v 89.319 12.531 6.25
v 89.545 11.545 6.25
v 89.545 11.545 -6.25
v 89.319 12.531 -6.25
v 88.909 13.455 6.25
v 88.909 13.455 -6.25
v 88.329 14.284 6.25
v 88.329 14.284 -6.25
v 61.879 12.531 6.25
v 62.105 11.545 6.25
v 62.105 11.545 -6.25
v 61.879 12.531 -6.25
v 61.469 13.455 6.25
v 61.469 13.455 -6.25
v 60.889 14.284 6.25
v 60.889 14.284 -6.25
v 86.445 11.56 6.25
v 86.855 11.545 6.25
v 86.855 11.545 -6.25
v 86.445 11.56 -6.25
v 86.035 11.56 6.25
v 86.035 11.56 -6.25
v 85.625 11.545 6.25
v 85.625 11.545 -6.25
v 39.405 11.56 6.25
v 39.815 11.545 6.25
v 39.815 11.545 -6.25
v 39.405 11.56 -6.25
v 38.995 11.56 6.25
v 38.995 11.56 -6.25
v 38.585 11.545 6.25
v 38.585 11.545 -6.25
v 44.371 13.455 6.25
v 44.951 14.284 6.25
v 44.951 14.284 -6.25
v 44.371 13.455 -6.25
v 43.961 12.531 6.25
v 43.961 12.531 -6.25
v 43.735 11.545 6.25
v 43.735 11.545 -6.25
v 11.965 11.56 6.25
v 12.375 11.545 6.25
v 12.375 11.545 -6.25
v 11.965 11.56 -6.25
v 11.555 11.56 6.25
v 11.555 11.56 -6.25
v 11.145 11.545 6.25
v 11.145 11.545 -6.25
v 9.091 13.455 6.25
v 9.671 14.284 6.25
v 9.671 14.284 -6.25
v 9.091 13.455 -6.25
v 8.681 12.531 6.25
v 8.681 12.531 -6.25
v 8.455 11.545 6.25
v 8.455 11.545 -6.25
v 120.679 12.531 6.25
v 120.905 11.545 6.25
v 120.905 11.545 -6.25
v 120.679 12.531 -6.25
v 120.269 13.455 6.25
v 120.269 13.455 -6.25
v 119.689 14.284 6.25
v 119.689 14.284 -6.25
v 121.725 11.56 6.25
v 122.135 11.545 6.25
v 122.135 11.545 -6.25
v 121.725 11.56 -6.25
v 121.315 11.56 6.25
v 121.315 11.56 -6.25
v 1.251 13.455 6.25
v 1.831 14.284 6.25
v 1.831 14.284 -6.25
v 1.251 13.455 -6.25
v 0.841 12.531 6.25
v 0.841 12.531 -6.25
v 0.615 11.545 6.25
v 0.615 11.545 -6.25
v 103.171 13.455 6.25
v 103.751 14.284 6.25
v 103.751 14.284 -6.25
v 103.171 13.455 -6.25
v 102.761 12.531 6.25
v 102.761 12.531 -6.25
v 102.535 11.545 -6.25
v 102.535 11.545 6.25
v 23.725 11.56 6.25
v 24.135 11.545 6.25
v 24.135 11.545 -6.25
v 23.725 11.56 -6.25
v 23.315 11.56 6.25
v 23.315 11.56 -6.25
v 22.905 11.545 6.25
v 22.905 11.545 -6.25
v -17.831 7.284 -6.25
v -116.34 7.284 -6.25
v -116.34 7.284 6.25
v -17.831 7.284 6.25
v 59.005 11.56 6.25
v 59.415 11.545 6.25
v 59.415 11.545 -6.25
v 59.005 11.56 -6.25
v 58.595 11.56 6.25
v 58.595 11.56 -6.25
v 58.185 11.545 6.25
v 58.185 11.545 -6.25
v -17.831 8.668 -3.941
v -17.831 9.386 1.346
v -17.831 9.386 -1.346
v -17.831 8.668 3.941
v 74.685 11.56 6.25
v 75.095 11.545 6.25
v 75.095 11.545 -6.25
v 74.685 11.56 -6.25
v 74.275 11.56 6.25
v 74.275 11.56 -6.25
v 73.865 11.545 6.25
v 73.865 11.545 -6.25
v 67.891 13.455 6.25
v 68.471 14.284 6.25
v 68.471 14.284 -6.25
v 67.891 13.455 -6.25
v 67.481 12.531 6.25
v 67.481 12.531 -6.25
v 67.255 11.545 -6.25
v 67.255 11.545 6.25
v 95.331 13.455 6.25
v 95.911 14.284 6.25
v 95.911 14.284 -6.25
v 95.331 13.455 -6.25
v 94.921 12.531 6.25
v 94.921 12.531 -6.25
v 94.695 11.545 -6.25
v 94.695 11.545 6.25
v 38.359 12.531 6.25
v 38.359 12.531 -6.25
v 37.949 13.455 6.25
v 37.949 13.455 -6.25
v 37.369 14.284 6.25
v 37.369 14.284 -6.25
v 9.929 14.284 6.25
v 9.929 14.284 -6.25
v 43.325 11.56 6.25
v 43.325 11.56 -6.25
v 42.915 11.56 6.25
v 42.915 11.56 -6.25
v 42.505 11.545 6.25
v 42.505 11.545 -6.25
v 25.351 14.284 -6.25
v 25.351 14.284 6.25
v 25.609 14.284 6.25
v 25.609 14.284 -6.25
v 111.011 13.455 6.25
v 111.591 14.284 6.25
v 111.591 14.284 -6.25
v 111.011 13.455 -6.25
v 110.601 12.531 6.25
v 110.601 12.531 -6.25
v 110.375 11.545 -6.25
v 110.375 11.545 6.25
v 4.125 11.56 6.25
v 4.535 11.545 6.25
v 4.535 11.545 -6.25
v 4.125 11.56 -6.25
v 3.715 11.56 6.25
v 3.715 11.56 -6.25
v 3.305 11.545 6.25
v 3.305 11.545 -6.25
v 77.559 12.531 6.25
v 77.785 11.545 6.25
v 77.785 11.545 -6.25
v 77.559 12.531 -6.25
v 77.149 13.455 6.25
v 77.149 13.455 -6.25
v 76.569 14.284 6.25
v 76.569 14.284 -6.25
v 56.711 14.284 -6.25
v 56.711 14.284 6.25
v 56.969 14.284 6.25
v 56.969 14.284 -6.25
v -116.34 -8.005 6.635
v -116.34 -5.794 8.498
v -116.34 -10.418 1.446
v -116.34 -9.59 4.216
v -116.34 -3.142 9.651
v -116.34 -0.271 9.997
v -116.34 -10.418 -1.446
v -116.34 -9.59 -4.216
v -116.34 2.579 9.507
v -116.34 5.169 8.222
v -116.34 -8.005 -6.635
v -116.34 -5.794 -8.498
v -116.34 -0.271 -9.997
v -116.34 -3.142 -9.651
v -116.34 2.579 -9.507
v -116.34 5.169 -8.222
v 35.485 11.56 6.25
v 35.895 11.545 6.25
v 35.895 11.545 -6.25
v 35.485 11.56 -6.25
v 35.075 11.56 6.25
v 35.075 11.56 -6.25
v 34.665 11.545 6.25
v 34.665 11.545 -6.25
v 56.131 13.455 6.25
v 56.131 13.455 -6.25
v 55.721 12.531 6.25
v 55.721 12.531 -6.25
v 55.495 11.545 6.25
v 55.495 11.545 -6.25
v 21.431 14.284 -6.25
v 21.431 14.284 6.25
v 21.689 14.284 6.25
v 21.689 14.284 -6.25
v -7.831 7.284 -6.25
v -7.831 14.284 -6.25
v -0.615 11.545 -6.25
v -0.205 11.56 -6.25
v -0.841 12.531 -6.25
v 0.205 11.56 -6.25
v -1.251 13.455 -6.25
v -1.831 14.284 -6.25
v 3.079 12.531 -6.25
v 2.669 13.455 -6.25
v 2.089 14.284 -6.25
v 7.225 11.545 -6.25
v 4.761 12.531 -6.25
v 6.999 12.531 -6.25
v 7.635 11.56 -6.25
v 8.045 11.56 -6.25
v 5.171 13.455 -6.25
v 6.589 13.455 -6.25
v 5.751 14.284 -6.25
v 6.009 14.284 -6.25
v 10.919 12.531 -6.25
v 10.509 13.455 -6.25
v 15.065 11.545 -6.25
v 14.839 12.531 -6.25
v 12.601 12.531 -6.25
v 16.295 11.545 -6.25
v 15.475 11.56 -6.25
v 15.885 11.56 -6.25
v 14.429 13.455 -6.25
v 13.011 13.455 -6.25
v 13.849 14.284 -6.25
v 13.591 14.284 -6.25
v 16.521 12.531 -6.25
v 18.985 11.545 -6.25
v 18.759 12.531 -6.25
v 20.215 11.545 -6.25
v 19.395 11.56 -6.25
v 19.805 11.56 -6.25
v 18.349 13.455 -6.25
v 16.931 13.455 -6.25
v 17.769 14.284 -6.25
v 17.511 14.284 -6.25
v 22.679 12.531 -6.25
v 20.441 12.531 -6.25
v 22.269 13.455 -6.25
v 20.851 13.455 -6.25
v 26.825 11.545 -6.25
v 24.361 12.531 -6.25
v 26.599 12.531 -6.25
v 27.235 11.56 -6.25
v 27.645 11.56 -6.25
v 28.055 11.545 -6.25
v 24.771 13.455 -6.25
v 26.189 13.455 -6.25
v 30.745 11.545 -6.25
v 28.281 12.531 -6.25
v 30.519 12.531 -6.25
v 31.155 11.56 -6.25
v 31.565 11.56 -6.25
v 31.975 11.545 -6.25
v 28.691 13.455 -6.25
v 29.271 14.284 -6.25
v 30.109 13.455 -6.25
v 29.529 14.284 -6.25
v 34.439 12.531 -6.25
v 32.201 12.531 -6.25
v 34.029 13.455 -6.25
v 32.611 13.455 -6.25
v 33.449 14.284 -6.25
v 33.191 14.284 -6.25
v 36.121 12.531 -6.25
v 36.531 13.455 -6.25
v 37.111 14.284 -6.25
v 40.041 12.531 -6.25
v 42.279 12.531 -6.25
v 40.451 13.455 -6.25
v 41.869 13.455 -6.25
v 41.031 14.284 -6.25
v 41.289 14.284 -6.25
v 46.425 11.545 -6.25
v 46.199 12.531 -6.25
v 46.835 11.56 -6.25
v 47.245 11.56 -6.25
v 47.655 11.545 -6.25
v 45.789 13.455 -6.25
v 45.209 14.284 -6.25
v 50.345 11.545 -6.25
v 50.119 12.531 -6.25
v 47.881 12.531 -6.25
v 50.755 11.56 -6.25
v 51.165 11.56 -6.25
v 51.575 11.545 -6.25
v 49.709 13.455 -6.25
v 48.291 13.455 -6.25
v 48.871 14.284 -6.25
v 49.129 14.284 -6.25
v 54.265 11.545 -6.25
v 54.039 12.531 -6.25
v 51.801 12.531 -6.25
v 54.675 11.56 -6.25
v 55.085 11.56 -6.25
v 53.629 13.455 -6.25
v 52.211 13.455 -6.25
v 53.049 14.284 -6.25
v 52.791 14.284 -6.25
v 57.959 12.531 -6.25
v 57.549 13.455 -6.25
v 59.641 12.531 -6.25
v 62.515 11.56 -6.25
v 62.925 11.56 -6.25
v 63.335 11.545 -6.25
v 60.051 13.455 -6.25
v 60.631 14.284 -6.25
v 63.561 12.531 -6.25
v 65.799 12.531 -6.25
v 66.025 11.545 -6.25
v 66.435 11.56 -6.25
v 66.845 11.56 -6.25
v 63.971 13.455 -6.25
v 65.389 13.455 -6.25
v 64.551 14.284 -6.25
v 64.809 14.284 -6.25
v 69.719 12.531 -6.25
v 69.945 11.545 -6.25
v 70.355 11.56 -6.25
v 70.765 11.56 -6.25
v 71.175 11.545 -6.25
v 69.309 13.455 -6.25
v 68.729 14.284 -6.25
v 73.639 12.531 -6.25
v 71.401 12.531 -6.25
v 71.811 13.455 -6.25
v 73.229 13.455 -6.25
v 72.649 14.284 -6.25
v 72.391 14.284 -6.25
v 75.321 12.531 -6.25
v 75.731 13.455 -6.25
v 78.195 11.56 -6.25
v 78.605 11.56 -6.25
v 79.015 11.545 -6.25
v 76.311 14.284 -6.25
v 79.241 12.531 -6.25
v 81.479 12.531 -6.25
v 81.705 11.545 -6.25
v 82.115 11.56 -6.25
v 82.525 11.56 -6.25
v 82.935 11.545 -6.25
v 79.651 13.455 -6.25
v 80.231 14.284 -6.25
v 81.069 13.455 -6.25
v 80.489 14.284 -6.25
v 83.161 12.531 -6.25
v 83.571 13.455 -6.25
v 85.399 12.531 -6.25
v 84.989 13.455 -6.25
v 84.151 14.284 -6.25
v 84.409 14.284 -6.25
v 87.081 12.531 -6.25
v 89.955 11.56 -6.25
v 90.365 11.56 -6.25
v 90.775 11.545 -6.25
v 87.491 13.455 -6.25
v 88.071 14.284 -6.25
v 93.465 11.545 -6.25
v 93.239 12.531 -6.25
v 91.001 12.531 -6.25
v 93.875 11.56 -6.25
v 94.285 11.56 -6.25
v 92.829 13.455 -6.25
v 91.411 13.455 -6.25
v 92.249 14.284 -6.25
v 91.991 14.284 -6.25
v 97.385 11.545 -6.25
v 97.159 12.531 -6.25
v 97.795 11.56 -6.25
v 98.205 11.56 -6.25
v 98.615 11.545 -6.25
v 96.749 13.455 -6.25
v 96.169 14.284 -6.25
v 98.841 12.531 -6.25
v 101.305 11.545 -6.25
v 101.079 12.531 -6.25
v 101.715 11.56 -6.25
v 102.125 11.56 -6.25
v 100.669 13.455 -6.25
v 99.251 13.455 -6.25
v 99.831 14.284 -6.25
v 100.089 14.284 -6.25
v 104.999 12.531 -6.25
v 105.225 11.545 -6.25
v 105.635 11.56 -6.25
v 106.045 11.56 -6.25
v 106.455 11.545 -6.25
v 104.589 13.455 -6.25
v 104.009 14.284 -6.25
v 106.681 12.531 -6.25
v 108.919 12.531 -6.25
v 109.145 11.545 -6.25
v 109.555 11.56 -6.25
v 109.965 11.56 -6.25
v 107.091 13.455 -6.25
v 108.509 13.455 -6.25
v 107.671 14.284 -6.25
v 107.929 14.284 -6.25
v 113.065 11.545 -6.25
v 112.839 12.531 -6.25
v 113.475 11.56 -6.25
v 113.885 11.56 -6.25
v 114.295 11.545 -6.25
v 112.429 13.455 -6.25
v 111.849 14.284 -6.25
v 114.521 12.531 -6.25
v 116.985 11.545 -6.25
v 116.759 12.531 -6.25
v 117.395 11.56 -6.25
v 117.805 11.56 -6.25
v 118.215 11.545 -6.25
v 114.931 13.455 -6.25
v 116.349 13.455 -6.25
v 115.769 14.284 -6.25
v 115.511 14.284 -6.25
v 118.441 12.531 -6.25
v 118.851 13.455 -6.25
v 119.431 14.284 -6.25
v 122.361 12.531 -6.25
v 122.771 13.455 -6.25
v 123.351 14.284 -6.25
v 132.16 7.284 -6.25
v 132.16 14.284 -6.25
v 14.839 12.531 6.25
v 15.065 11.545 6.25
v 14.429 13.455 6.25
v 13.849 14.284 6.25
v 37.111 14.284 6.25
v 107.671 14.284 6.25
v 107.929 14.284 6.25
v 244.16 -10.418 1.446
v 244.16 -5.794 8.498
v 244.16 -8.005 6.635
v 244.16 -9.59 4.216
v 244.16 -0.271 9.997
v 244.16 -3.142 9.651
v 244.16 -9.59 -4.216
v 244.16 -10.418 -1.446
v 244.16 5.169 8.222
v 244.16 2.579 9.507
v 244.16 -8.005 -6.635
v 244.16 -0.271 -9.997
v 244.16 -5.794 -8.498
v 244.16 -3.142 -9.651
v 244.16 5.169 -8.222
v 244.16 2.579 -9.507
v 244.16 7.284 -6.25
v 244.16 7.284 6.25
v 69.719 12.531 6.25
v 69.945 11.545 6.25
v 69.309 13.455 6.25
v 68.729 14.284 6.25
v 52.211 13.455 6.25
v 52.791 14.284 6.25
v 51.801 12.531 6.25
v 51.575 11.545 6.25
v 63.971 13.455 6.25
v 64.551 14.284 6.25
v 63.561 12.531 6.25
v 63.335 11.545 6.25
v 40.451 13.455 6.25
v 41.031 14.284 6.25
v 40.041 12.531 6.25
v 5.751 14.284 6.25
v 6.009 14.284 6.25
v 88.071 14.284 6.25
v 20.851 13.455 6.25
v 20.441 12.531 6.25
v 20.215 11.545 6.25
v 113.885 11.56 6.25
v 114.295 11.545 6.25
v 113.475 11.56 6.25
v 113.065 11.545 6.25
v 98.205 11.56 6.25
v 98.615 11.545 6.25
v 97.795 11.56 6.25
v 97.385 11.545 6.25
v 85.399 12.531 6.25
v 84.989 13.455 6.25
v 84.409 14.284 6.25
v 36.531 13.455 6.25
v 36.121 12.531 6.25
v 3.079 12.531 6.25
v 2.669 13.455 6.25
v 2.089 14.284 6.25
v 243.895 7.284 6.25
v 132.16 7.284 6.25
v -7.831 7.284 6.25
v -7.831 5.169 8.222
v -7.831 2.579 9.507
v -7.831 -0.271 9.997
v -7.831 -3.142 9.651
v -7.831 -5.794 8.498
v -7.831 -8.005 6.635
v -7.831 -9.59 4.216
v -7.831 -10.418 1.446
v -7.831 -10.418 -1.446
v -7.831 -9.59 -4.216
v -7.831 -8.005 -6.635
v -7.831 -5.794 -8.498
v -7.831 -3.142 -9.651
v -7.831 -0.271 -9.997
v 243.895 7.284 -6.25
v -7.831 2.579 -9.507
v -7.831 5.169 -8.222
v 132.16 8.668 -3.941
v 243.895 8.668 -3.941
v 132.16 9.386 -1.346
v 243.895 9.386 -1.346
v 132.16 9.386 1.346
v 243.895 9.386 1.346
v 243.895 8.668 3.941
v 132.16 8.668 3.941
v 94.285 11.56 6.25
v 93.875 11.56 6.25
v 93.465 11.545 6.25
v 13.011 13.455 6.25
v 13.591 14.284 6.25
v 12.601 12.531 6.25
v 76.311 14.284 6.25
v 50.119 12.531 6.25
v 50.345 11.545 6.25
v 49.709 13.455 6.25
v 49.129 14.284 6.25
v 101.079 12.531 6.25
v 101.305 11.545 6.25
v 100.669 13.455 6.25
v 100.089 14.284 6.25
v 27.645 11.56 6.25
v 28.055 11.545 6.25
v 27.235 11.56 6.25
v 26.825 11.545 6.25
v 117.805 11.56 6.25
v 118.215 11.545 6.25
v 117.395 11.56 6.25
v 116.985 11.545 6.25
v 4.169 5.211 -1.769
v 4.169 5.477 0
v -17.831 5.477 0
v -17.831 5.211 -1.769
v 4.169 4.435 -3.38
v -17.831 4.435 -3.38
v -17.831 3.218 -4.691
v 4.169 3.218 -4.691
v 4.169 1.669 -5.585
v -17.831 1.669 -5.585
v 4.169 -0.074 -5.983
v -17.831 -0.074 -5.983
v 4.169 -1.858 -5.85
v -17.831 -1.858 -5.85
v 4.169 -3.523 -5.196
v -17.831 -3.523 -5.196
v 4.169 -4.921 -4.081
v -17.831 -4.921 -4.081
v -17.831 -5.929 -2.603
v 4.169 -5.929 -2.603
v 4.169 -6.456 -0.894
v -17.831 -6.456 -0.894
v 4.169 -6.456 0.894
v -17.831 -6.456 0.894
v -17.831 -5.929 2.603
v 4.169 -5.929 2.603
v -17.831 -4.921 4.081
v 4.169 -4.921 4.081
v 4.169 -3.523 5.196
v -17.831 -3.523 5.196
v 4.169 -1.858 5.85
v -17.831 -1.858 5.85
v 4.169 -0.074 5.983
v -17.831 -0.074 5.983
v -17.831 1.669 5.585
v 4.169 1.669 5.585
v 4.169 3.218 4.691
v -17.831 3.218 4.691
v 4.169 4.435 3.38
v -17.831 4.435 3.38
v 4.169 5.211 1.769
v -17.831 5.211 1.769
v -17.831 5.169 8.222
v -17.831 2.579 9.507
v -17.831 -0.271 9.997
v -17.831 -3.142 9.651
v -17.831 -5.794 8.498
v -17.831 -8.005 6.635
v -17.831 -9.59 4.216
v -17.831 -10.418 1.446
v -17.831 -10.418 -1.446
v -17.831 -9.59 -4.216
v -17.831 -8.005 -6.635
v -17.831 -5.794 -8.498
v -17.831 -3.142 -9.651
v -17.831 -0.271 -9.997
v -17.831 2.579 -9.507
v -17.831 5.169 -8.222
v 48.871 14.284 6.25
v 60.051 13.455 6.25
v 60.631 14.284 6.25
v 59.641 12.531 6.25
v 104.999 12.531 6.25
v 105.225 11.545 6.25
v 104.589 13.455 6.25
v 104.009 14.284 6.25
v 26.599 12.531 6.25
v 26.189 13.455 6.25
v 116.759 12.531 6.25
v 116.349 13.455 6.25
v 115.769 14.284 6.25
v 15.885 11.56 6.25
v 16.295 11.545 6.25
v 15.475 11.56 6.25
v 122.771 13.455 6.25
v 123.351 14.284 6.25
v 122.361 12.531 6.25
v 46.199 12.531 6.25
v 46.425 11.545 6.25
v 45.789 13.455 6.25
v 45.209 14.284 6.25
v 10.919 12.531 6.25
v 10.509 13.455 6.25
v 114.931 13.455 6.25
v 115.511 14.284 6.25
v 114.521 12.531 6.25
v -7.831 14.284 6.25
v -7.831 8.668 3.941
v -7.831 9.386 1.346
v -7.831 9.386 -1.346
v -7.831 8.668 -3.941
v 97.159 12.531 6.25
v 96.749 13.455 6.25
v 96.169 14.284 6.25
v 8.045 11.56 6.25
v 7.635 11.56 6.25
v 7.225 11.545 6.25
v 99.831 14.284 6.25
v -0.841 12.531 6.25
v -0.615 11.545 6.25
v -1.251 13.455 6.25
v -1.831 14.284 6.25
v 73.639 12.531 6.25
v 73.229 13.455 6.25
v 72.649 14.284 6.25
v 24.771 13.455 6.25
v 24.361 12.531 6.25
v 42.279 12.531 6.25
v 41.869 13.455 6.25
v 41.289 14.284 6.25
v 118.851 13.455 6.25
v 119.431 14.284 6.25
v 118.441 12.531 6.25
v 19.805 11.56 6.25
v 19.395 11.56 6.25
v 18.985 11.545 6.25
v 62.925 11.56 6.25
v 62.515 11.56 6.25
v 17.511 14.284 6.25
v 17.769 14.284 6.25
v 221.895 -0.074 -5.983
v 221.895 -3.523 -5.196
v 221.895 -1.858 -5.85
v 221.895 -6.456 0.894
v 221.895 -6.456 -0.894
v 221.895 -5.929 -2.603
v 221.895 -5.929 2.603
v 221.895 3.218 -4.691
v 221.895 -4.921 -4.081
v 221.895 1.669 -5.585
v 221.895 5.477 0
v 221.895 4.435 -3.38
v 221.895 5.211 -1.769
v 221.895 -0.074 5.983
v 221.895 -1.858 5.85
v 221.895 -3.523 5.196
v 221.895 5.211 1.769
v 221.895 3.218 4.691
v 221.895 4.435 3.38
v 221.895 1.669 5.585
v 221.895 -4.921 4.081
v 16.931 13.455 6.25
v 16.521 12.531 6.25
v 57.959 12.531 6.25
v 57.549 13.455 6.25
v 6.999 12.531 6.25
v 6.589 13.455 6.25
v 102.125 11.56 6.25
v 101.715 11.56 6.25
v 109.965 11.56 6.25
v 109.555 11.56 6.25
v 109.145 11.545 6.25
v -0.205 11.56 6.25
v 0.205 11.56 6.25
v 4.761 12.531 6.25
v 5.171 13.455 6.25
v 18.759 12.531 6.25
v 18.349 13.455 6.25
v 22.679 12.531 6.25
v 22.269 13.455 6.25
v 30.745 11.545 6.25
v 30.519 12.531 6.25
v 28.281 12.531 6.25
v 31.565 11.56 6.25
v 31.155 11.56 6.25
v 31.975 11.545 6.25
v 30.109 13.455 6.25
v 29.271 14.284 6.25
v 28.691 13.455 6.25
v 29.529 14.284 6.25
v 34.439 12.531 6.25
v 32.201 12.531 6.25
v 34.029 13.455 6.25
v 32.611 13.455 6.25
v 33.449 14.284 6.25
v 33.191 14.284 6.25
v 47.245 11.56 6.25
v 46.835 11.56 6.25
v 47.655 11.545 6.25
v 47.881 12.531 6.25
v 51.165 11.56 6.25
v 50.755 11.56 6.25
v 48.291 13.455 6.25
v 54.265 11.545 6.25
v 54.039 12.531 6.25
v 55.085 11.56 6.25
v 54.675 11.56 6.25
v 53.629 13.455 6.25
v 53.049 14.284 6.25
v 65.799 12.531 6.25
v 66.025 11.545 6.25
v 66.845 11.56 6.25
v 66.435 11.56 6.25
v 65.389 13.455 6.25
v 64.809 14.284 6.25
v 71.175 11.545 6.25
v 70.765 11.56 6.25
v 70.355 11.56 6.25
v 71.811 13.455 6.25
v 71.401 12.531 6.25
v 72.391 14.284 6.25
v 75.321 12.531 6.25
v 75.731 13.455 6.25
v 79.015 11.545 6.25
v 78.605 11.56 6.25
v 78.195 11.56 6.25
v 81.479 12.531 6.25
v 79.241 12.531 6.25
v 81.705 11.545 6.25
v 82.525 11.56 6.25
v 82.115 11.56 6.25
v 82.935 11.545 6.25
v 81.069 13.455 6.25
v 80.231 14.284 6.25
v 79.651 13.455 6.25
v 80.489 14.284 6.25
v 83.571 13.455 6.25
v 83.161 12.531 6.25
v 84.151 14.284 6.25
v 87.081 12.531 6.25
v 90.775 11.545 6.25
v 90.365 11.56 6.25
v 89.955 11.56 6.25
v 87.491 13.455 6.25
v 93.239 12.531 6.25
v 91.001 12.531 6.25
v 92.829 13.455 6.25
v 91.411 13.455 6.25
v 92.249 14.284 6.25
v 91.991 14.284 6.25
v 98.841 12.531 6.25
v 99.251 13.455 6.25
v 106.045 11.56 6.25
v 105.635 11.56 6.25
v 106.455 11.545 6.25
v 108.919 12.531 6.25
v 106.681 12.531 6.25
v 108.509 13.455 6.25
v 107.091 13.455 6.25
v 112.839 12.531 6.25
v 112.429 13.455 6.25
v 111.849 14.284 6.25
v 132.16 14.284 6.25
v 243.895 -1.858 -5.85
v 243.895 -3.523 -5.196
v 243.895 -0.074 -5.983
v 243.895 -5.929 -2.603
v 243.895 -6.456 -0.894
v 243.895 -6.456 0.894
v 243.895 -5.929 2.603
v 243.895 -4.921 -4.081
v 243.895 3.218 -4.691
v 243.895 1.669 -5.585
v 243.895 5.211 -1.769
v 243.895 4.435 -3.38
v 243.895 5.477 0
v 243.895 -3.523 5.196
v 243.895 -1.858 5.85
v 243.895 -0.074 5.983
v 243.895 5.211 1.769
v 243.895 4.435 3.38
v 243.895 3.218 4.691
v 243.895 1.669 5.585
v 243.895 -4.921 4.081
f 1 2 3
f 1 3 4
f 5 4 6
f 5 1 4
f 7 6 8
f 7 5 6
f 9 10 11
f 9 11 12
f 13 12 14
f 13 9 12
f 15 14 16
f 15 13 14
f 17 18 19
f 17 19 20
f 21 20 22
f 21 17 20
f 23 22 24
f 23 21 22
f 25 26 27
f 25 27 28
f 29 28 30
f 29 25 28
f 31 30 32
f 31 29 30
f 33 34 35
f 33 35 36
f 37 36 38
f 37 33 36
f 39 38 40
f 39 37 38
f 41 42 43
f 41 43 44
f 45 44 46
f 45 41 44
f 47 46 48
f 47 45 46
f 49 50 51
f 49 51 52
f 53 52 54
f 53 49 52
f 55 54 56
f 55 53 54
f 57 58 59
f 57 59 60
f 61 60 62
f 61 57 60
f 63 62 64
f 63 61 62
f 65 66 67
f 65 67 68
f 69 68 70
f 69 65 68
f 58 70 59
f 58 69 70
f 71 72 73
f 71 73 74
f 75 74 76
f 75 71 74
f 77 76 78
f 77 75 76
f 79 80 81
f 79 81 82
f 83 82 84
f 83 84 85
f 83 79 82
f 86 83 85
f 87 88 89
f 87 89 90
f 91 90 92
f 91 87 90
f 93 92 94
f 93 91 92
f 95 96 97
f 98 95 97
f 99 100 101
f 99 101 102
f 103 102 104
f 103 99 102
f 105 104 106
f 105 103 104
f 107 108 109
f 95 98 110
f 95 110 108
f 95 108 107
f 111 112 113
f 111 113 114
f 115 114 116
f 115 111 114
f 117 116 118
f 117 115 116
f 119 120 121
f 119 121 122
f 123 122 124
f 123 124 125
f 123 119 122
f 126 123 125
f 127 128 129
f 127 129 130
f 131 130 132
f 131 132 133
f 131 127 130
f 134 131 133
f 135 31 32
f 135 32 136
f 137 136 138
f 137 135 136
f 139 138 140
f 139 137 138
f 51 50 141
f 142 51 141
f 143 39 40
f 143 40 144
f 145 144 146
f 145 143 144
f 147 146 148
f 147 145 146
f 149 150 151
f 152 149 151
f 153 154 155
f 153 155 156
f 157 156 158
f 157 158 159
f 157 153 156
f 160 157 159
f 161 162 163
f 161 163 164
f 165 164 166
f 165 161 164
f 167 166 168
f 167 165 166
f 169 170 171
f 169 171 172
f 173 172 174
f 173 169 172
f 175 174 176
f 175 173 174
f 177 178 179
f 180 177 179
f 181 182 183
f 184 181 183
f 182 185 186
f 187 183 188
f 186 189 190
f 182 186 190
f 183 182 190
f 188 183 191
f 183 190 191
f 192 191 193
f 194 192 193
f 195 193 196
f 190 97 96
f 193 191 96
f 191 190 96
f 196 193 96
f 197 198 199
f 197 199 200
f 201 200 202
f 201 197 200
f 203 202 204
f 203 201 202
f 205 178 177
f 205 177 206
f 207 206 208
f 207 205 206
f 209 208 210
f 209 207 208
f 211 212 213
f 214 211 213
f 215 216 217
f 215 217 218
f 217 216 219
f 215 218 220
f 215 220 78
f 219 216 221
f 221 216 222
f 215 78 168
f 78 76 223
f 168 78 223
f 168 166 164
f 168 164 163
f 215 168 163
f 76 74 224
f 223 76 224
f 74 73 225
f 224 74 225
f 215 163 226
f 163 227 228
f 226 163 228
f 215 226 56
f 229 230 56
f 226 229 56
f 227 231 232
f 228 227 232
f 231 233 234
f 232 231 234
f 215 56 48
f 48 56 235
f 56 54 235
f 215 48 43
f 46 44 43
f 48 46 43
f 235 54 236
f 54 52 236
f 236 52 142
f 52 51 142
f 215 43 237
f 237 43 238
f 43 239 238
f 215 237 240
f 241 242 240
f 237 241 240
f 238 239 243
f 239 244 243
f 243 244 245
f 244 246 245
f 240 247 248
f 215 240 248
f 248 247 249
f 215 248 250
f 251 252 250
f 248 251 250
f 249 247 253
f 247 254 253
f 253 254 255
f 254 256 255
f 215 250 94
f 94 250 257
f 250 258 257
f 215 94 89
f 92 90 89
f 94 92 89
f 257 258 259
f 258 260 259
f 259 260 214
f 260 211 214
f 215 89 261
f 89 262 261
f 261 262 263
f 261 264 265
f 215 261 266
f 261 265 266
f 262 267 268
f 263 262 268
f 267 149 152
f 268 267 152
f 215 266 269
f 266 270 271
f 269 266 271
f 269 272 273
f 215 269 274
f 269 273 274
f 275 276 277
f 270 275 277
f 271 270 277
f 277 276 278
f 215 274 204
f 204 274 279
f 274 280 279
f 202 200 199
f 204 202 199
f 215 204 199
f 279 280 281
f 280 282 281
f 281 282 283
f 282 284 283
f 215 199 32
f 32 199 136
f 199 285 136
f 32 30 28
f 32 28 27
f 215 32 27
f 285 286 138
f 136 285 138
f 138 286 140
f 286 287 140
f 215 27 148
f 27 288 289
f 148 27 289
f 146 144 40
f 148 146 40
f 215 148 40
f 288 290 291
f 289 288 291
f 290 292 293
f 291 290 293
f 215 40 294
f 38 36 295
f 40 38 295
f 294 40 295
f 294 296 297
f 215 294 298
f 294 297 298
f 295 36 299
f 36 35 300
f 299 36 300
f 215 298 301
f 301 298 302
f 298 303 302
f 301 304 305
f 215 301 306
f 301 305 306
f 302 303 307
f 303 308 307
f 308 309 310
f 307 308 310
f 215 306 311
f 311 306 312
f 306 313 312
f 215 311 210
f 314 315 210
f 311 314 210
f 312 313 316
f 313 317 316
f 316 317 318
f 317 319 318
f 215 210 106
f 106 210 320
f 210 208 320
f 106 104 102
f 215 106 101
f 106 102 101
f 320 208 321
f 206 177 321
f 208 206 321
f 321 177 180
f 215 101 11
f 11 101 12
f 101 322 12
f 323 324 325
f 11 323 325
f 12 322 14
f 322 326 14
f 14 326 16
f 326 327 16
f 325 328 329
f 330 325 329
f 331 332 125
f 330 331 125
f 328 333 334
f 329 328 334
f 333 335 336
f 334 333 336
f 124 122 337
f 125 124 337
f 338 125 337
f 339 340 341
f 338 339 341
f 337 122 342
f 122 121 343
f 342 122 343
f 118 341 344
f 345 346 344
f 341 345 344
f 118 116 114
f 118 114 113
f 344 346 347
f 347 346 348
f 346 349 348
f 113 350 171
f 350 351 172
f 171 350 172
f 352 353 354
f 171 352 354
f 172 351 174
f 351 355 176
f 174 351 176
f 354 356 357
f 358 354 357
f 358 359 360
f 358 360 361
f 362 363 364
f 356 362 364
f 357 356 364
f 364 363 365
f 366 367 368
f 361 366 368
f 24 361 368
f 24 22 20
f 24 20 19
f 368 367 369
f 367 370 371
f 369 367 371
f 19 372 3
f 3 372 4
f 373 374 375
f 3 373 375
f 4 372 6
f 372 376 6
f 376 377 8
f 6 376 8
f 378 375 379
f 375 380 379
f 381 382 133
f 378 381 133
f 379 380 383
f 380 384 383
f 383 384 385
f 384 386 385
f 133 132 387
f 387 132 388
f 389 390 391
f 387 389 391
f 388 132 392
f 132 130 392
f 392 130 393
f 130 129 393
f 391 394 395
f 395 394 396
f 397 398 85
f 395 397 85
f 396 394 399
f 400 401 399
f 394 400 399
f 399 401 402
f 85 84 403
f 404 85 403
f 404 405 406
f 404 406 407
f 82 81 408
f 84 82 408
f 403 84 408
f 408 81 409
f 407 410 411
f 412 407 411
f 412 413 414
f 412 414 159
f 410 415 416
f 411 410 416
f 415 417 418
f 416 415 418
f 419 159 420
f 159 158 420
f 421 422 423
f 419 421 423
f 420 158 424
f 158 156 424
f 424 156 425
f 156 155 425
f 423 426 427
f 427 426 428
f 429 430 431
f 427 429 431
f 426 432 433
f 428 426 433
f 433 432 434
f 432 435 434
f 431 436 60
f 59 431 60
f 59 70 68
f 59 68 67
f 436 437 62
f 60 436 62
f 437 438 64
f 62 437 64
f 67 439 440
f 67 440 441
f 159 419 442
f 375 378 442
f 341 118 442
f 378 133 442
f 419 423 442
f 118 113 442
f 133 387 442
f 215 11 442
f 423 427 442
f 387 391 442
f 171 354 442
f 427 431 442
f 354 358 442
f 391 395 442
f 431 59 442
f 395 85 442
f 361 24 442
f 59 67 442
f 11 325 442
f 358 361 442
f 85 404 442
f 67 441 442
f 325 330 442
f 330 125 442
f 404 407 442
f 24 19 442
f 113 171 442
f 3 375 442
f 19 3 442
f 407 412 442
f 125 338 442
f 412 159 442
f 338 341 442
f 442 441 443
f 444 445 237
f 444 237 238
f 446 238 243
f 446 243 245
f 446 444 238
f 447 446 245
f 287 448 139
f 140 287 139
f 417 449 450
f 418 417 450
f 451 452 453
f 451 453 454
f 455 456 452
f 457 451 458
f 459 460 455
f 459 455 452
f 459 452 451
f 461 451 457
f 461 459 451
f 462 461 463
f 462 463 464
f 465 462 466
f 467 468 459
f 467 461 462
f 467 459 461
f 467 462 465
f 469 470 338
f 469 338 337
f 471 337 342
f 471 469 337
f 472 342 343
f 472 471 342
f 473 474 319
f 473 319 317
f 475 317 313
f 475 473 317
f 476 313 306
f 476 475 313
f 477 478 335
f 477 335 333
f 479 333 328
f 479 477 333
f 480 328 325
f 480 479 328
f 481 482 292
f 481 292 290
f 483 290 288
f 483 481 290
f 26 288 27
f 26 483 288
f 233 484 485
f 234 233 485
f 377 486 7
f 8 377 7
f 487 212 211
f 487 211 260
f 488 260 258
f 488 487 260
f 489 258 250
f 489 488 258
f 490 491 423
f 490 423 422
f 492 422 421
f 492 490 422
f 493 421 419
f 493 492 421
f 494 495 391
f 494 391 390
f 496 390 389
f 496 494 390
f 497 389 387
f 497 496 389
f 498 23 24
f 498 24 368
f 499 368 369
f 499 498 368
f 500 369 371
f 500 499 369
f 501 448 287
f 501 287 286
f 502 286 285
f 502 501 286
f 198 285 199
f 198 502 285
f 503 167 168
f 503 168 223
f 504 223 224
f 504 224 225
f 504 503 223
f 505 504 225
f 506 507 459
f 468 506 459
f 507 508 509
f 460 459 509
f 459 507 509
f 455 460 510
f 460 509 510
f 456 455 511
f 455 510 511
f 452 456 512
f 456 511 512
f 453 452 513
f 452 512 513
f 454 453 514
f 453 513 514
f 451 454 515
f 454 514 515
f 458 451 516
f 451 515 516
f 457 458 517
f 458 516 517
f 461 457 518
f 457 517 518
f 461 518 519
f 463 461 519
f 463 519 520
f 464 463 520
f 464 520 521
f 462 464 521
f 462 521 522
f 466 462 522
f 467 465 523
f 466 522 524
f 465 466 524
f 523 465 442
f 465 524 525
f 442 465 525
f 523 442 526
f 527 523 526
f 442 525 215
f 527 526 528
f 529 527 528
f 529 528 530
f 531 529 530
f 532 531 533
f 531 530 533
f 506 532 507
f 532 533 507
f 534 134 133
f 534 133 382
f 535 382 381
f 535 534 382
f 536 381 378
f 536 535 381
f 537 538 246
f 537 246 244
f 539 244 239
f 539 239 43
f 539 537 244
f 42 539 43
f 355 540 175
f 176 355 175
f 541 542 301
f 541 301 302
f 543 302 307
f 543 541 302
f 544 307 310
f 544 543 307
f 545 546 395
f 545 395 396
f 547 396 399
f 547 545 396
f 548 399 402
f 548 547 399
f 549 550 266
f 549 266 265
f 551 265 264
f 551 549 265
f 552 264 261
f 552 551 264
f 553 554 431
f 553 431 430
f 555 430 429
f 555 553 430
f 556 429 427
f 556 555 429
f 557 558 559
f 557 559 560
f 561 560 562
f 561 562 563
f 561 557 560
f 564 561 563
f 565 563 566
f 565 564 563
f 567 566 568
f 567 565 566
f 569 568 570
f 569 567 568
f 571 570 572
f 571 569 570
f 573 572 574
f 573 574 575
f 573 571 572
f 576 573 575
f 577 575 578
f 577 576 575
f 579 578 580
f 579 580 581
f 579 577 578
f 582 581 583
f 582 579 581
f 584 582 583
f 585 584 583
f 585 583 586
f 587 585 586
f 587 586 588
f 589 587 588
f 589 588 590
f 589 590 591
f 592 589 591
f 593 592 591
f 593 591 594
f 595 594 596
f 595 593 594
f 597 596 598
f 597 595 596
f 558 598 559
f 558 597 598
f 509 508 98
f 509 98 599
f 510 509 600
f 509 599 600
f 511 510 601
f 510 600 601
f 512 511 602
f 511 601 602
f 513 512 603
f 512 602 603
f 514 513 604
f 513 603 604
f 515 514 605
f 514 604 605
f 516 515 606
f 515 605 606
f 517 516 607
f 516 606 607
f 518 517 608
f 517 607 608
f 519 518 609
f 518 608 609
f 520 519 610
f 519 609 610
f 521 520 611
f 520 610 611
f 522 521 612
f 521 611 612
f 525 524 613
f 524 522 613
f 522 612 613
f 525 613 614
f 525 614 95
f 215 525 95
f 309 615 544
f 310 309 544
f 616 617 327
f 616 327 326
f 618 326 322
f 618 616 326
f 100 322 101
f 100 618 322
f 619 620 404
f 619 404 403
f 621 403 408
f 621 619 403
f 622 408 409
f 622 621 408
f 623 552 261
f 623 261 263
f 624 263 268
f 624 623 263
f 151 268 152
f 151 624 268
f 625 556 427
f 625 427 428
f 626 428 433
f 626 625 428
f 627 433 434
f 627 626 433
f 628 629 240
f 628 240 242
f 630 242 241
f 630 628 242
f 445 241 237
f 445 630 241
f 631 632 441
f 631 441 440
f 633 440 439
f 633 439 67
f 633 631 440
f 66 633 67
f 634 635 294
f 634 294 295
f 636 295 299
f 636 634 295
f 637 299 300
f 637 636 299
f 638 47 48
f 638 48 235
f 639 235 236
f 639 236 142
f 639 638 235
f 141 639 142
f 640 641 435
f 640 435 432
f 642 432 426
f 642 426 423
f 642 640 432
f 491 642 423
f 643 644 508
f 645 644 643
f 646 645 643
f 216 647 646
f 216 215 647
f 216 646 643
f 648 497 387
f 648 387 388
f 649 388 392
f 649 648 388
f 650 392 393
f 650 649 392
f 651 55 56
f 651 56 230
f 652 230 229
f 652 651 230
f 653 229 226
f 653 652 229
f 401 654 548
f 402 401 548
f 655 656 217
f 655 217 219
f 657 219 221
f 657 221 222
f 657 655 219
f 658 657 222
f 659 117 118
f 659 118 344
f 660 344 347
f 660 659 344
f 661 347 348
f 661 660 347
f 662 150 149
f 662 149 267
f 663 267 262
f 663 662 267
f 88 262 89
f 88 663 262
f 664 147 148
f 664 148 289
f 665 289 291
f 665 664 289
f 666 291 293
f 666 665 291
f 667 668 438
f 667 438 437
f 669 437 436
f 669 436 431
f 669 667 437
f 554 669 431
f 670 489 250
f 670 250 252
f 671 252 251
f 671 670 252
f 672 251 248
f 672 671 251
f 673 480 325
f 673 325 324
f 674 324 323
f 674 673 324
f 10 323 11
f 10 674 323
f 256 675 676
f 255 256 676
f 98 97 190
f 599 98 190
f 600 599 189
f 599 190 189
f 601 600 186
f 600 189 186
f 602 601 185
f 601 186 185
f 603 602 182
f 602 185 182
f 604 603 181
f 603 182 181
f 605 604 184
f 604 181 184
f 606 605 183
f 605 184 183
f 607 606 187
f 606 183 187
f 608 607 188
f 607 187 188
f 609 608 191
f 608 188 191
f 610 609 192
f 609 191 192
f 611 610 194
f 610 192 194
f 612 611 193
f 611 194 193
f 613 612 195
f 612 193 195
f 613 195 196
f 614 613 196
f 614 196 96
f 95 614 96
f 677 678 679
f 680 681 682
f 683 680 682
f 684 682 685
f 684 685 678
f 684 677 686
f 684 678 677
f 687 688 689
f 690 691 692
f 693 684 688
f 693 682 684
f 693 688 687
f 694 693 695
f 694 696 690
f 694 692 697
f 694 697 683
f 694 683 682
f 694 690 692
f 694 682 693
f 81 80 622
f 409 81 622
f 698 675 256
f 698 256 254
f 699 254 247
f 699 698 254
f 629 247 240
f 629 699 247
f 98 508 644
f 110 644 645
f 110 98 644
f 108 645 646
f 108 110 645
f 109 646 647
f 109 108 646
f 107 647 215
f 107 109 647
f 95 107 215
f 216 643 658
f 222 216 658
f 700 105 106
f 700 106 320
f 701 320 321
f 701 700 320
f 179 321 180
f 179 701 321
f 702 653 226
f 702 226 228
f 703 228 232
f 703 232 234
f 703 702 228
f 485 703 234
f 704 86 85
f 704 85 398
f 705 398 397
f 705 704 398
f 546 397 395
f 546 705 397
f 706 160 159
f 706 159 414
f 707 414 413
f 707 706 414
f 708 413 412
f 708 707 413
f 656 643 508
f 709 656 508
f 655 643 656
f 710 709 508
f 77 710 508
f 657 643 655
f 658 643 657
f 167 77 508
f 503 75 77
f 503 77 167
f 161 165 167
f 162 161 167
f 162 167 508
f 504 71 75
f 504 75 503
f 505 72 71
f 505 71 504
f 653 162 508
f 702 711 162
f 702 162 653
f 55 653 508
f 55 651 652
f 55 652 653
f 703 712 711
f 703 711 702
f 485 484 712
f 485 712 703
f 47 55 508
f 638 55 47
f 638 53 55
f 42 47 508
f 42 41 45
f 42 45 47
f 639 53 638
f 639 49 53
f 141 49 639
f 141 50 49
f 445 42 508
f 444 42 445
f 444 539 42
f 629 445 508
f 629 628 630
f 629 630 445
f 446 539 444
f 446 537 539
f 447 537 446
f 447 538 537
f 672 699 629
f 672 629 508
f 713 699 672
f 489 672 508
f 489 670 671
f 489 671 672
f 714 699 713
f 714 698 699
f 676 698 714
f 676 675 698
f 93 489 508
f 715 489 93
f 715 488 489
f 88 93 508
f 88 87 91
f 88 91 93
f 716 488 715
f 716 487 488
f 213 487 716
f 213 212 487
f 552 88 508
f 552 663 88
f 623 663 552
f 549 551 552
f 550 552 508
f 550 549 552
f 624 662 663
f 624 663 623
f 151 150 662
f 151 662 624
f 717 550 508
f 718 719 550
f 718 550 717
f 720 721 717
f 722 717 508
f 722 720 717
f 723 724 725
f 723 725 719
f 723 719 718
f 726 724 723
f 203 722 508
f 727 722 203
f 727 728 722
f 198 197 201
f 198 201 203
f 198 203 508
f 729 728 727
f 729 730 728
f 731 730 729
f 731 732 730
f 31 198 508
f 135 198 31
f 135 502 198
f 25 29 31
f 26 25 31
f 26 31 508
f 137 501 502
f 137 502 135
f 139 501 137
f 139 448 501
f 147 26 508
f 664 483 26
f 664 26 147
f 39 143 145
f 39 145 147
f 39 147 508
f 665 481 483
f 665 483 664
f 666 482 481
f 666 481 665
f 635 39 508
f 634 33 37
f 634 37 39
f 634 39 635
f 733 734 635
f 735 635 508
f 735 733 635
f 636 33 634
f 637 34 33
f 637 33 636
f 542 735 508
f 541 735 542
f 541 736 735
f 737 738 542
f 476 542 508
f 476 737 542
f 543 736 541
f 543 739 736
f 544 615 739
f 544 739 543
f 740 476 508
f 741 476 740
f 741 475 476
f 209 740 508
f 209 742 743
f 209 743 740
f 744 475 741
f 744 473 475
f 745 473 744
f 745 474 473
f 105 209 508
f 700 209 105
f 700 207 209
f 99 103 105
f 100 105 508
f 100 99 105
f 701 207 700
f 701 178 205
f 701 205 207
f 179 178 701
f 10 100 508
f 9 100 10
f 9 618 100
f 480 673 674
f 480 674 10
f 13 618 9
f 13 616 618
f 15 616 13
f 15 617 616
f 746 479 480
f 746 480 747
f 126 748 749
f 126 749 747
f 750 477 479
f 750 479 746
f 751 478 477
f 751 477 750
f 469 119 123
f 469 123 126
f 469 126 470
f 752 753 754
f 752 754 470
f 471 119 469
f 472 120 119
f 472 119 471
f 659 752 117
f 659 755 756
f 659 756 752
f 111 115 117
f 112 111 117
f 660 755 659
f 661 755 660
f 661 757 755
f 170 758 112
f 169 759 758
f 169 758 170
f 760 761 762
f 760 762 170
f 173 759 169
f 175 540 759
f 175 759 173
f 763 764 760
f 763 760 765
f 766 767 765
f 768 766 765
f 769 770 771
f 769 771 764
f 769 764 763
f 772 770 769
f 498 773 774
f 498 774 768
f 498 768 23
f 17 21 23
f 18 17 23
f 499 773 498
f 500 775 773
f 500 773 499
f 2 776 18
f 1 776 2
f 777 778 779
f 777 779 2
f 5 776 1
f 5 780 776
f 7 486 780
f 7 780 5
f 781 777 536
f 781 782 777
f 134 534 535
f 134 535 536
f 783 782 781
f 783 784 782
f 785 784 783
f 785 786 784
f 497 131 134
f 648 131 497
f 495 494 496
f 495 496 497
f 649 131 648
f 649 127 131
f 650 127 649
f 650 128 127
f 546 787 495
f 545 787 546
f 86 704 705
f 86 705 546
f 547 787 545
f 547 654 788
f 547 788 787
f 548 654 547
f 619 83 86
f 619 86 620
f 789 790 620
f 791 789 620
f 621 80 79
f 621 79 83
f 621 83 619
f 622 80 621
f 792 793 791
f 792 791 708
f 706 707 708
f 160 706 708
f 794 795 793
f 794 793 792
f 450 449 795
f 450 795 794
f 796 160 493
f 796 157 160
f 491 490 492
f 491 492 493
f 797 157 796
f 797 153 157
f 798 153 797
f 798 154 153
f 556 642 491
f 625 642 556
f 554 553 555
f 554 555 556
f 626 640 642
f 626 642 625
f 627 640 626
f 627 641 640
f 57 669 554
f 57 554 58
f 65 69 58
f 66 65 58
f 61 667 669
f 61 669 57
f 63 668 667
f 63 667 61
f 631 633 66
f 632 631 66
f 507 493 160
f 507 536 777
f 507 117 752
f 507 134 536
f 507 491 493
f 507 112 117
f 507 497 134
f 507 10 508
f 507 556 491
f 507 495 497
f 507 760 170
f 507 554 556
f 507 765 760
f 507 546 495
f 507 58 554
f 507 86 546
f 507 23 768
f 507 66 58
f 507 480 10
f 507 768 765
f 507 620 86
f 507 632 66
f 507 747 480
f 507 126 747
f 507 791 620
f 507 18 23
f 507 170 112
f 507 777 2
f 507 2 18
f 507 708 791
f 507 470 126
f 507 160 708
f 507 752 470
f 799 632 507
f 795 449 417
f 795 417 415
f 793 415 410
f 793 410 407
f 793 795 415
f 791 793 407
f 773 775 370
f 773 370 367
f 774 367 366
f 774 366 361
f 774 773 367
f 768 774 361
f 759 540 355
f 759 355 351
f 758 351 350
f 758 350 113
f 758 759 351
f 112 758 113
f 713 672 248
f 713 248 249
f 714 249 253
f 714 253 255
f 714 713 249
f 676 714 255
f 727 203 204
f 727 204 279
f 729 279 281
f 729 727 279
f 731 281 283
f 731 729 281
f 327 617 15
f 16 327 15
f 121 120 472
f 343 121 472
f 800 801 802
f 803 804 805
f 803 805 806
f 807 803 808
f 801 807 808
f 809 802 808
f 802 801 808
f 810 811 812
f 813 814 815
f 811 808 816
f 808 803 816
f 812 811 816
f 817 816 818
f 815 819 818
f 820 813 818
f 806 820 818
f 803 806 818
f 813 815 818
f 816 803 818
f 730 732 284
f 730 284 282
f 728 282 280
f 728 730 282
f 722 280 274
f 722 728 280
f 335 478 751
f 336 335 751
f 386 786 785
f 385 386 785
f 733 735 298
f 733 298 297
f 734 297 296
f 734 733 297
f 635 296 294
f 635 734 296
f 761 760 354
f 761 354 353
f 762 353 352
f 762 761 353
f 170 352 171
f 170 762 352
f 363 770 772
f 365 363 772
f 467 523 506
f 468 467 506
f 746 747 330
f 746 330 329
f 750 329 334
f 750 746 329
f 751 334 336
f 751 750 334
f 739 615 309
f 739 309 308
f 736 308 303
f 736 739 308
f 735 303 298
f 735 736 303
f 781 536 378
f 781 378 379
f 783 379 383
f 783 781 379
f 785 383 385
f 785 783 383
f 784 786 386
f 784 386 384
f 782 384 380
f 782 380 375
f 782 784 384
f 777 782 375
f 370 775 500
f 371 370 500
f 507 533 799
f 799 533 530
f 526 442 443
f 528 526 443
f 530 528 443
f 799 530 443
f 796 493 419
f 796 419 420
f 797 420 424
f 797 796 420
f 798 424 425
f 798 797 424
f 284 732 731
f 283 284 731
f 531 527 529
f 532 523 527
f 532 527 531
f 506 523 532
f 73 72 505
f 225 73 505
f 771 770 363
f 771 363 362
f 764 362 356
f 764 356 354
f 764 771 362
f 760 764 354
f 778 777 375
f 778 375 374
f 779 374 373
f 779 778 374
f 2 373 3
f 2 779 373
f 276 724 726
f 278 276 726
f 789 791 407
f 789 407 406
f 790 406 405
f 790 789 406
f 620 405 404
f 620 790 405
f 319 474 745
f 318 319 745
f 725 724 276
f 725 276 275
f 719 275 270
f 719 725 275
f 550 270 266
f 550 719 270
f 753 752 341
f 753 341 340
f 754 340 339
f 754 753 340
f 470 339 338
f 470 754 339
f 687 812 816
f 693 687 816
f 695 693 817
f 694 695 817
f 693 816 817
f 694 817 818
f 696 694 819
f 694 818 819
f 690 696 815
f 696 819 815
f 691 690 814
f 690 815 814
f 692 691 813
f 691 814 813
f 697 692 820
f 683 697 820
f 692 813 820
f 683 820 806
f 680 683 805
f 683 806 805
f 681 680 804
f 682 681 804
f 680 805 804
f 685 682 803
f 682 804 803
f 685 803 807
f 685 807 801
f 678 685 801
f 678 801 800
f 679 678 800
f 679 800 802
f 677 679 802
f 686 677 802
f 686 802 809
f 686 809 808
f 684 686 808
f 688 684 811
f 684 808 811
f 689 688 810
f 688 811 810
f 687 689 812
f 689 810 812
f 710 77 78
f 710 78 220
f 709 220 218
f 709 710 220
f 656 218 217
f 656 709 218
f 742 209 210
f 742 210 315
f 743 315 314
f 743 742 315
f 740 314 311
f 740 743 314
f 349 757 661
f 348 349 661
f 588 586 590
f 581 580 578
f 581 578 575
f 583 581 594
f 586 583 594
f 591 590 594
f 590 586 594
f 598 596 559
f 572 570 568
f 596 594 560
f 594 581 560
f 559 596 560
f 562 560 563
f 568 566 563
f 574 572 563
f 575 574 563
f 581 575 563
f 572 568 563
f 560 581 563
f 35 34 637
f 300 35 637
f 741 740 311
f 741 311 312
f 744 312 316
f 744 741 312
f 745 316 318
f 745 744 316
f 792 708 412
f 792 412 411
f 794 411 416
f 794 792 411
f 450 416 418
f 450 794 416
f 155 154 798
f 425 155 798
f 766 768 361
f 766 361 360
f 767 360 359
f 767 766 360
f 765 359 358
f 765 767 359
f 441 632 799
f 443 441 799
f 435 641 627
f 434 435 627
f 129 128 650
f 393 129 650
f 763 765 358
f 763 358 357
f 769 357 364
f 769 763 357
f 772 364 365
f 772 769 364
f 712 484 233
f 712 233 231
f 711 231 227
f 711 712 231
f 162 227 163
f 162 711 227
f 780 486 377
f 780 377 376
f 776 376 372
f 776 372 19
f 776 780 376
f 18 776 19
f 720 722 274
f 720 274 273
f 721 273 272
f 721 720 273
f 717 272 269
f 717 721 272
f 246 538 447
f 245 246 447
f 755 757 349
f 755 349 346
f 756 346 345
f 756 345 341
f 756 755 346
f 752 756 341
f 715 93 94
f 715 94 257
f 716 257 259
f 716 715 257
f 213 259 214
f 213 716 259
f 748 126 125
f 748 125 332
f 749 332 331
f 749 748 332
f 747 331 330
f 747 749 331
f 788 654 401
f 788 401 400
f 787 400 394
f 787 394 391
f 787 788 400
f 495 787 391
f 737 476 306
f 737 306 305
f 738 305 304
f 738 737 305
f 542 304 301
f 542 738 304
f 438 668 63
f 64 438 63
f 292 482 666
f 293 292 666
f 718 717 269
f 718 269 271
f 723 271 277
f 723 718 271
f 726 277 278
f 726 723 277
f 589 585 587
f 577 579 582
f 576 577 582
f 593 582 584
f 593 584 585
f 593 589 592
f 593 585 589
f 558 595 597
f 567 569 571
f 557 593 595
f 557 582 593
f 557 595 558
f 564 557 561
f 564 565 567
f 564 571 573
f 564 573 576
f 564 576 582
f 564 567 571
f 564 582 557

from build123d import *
from build123d.topology import SkipClean

# Parameters (mm, degrees)
SKETCH1_W                = 150
SKETCH1_H                = 7
BOSS_EXTRUDE2_DEPTH      = 6.25
CUT_EXTRUDE1_DEPTH       = 140.036501376
LPATTERN1_COUNT          = 32
LPATTERN1_PITCH          = 3.92
CUT_EXTRUDE2_START       = -6.25
CUT_EXTRUDE2_OUTLINE_W   = 4.009572156
CUT_EXTRUDE2_OUTLINE_H   = 7
CUT_EXTRUDE2_OUTLINE_W_2 = 6
CUT_EXTRUDE2_DEPTH       = 12.5
BOSS_EXTRUDE3_DEPTH      = 112
BOSS_EXTRUDE3_DEPTH_BACK = 248.5
SKETCH7_R                = 10
BOSS_EXTRUDE4_DEPTH      = 111.735590033
SKETCH8_R                = 6
CUT_EXTRUDE3_DEPTH       = 22
BOSS_EXTRUDE5_START      = 10
SKETCH10_R               = 10
BOSS_EXTRUDE5_DEPTH      = 10
CUT_EXTRUDE5_START       = -22
SKETCH11_R               = 6
CUT_EXTRUDE5_DEPTH       = 22


# Read off the part's stored shape, not the designer's step: Cut-Extrude2
with BuildPart() as part:
    # Sketch1 → Boss-Extrude2 (new, symmetric)
    with BuildSketch(Plane.XY):
        with Locations((63.159569831, 10.783538746)):
            Rectangle(SKETCH1_W, SKETCH1_H)
    extrude(amount=BOSS_EXTRUDE2_DEPTH, both=True)

    # Sketch2 → Cut-Extrude1 (cut, symmetric)
    with BuildSketch(Plane.XY):
        with BuildLine():
            ThreePointArc((0.615260942, 11.545117419), (0, 11.5615), (-0.615260942, 11.545117419))
            ThreePointArc((-0.615260942, 11.545117419), (-1.023565158, 13.002884474), (-1.830858013, 14.283538746))
            ThreePointArc((-1.830858013, 14.283538746), (0, 14.4004), (1.830858013, 14.283538746))
            ThreePointArc((1.830858013, 14.283538746), (1.023565158, 13.002884474), (0.615260942, 11.545117419))
        make_face()
    cut_extrude1 = extrude(amount=CUT_EXTRUDE1_DEPTH, both=True, mode=Mode.SUBTRACT)

    # LPattern1: Cut-Extrude1 ×32
    with Locations(*[(i * LPATTERN1_PITCH, 0, 0) for i in range(1, LPATTERN1_COUNT)]):
        add(cut_extrude1, mode=Mode.SUBTRACT)

    # Cut-Extrude2 outline → Cut-Extrude2 (cut)
    with BuildSketch(Plane.XY.offset(CUT_EXTRUDE2_START)):
        with Locations((-9.835644091, 10.783538746)):
            Rectangle(CUT_EXTRUDE2_OUTLINE_W, CUT_EXTRUDE2_OUTLINE_H)
        with Locations((135.159569831, 10.783538746)):
            Rectangle(CUT_EXTRUDE2_OUTLINE_W_2, CUT_EXTRUDE2_OUTLINE_H)
    extrude(amount=CUT_EXTRUDE2_DEPTH, mode=Mode.SUBTRACT)

    # Sketch5 → Boss-Extrude3 (add, two sides: drawn at the far end of the back side and taken through both)
    with BuildSketch(Plane(origin=(132.159569831, 0, 0), x_dir=(0, 0, -1), z_dir=(1, 0, 0)).offset(-BOSS_EXTRUDE3_DEPTH_BACK)):
        with BuildLine():
            Line((6.25, 7.283538746), (-6.25, 7.283538746))
            ThreePointArc((-6.25, 7.283538746), (0, -10.522708752), (6.25, 7.283538746))
        make_face()
    extrude(amount=BOSS_EXTRUDE3_DEPTH + BOSS_EXTRUDE3_DEPTH_BACK)

    # Sketch7 → Boss-Extrude4 (add)
    with BuildSketch(Plane(origin=(132.159569831, 0, 0), x_dir=(0, 0, -1), z_dir=(1, 0, 0))):
        with Locations(Location((0, -0.522708752, 0), (0, 0, 128.682187453))):
            Circle(SKETCH7_R)
    extrude(amount=BOSS_EXTRUDE4_DEPTH)

    # Sketch8 → Cut-Extrude3 (cut)
    with BuildSketch(Plane(origin=(243.895159863, 0, 0), x_dir=(0, 0, -1), z_dir=(1, 0, 0))):
        with Locations(Location((0, -0.522708752, 0), (0, 0, 90))):
            Circle(SKETCH8_R)
    extrude(amount=-CUT_EXTRUDE3_DEPTH, mode=Mode.SUBTRACT)

    # Sketch10 → Boss-Extrude5 (add)
    with SkipClean():  # the faces are left unmerged after this step: merging them gives an invalid solid
        with BuildSketch(Plane.ZY.offset(7.830858013).offset(BOSS_EXTRUDE5_START)):
            with Locations(Location((0, -0.522708752, 0), (0, 0, 128.682187453))):
                Circle(SKETCH10_R)
        extrude(amount=-BOSS_EXTRUDE5_DEPTH)
    add(part.part.scale(1), mode=Mode.REPLACE)  # the faces are merged on a copy

    # Sketch11 → Cut-Extrude5 (cut)
    with BuildSketch(Plane.ZY.offset(17.830858013).offset(CUT_EXTRUDE5_START)):
        with Locations(Location((0, -0.522708752, 0), (0, 0, 90))):
            Circle(SKETCH11_R)
    extrude(amount=CUT_EXTRUDE5_DEPTH, mode=Mode.SUBTRACT)


solid = part.part
